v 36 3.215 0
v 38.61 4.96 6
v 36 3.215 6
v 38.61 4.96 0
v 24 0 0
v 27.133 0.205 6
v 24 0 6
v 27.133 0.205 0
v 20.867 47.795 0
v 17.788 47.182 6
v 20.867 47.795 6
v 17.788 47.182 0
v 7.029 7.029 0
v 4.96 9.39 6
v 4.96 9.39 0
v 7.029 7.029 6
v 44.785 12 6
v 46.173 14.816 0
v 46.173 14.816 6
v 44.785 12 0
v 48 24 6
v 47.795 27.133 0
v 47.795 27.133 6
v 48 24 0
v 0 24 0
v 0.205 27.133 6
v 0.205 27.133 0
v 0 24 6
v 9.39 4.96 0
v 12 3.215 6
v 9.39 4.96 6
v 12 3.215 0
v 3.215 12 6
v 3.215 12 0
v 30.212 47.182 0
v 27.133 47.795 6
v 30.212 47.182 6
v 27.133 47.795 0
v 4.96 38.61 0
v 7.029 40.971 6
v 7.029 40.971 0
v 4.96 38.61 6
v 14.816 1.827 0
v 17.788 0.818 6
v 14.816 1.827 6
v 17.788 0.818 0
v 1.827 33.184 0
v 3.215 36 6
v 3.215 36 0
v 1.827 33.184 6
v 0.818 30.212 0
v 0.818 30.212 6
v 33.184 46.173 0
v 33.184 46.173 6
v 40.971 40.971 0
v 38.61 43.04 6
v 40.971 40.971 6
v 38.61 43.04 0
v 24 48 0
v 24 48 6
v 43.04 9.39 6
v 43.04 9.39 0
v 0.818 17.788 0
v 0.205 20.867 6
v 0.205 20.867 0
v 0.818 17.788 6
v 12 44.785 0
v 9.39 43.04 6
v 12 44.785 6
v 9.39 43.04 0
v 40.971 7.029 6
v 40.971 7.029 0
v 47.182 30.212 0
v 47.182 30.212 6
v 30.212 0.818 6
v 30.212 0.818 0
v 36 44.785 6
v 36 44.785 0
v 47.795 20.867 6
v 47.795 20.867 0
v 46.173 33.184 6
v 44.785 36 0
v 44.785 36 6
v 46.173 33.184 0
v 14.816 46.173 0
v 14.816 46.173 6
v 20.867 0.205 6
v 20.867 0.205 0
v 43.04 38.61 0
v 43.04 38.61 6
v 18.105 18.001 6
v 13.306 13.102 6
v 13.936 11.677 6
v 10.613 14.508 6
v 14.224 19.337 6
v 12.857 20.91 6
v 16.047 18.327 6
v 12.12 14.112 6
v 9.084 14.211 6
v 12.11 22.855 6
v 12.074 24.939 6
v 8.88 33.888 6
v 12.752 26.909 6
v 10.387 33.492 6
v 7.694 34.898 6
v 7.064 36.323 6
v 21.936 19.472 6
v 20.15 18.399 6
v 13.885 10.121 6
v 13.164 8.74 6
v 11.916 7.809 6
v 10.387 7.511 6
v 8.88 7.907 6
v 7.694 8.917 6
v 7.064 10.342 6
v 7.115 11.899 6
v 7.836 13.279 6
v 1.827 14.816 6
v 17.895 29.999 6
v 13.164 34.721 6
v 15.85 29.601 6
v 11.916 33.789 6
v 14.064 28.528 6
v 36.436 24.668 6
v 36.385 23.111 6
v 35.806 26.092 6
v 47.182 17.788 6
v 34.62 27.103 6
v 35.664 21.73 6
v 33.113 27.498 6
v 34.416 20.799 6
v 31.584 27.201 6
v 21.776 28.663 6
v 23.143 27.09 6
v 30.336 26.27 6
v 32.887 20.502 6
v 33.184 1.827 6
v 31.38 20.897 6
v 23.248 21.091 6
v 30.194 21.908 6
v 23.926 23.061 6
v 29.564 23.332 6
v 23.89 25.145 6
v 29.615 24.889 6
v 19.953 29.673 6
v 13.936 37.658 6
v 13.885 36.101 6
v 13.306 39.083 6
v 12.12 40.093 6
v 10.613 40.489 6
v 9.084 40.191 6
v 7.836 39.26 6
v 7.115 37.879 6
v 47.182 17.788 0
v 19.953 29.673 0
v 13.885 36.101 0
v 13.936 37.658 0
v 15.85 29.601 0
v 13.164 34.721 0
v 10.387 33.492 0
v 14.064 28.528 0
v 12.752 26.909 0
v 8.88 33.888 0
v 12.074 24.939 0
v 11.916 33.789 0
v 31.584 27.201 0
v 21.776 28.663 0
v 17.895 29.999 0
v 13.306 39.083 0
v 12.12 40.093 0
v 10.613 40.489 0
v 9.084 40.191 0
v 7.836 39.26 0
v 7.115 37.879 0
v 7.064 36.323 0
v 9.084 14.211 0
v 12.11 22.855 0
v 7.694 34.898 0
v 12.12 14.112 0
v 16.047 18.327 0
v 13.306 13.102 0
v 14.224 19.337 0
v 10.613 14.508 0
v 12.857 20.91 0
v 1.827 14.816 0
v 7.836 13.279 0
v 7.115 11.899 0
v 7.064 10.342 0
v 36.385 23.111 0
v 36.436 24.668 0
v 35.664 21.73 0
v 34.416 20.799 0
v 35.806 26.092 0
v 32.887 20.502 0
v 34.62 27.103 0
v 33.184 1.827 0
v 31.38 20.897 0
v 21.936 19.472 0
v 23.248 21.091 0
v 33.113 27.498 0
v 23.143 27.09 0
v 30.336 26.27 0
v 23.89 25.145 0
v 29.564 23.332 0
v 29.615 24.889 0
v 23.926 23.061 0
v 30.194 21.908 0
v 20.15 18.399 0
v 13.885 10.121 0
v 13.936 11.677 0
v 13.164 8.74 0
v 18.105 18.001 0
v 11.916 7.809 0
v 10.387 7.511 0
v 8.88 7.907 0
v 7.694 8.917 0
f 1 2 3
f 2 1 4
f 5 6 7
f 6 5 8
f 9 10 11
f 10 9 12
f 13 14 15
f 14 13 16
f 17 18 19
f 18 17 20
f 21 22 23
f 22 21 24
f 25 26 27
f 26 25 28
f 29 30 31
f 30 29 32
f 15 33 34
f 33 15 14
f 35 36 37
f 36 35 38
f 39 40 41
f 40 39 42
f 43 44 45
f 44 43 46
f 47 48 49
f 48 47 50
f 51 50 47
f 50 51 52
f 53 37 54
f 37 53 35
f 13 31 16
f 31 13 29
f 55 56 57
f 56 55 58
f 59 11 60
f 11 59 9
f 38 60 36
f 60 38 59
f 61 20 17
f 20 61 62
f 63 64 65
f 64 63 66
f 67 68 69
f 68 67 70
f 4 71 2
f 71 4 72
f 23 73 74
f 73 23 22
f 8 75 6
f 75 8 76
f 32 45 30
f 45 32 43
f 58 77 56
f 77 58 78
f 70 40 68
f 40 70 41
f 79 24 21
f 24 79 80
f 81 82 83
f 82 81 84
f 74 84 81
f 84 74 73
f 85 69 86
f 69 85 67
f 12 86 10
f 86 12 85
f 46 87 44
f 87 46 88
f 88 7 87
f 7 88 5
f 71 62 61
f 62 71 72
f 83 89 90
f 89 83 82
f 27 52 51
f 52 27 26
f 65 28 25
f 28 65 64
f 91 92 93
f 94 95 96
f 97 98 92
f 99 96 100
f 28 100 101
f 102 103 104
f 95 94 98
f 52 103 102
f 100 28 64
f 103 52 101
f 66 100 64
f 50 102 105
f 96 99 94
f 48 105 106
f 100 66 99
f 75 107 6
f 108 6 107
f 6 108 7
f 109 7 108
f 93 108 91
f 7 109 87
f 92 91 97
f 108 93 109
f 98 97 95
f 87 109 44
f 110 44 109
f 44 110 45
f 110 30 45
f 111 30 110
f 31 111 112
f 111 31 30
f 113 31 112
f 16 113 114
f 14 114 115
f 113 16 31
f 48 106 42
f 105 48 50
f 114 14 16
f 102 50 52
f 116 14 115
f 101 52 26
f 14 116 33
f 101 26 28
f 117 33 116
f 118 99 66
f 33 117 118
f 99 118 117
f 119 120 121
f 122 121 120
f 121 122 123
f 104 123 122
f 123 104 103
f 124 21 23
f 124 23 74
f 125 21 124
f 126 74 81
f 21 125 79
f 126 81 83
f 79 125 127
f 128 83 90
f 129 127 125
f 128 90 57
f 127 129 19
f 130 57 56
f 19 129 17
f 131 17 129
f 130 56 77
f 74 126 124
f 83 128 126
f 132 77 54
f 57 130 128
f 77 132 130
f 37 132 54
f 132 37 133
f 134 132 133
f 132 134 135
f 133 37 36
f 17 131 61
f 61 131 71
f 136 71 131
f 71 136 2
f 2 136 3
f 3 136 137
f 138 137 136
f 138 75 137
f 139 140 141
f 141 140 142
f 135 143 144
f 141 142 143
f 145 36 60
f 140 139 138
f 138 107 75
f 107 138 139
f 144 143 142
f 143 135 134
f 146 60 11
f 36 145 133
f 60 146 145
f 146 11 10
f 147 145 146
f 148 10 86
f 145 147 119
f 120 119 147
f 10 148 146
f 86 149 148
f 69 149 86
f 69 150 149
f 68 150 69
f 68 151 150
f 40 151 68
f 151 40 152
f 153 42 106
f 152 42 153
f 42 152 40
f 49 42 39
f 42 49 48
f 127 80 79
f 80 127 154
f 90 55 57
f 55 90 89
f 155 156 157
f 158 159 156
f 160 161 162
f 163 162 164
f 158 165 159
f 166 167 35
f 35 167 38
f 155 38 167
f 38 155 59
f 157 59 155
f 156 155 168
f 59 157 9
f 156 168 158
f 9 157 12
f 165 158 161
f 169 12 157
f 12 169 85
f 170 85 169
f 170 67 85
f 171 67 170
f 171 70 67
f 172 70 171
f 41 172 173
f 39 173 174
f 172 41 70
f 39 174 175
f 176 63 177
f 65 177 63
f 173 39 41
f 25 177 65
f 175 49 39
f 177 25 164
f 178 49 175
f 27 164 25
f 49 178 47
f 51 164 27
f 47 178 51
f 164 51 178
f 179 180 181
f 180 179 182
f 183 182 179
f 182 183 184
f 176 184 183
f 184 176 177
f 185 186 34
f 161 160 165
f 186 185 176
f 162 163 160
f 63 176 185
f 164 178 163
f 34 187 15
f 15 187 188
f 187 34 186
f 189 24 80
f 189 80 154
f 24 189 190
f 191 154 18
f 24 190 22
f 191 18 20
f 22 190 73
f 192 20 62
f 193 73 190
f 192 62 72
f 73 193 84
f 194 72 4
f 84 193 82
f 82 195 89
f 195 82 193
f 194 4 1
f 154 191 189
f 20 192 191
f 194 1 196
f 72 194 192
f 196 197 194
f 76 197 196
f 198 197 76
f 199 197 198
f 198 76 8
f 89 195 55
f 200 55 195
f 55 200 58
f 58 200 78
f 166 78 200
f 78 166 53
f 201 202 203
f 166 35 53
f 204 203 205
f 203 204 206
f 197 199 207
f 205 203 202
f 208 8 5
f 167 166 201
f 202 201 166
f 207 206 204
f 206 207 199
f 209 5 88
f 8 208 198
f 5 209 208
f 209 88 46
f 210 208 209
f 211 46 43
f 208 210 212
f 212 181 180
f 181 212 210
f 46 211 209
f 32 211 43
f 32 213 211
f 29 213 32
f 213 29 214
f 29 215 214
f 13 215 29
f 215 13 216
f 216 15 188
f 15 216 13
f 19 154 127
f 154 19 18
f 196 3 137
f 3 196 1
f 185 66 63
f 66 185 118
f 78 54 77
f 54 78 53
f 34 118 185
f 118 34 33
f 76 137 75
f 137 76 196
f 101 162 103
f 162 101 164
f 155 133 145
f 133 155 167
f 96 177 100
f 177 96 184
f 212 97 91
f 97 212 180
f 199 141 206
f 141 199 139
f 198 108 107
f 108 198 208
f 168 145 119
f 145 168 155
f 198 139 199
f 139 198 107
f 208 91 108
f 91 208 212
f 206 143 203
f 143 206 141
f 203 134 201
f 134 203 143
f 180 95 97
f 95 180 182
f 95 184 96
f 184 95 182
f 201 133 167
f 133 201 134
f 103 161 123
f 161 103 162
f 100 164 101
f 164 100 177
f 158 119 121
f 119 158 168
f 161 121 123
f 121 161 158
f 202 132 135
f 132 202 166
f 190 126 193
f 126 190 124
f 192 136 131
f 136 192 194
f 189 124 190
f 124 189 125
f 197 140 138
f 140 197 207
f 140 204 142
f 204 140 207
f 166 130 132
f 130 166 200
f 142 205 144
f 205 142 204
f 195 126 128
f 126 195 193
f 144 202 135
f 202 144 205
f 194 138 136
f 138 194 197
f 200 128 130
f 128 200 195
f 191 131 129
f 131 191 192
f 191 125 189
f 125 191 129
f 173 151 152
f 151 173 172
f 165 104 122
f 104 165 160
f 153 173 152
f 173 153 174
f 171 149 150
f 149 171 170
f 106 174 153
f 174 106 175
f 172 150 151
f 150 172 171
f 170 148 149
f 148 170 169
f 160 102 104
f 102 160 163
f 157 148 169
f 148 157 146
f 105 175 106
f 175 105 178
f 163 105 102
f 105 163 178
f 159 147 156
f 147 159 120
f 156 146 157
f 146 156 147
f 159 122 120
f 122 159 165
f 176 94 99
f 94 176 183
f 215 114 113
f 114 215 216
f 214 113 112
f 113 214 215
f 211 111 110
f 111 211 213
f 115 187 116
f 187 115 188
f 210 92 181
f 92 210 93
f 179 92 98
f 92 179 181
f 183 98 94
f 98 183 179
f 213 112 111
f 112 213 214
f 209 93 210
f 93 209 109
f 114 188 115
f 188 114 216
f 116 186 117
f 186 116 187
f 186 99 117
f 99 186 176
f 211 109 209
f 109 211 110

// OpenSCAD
$fn = 32;

// ----------------------------------------------------------------------
// Cam plate: eccentric cam, base R24
// ----------------------------------------------------------------------

// --- parameters (mm) ---
base_r = 24;              // base circle radius
lobe_h = 14;              // cam lobe rise
bore_r = 6;               // shaft bore radius
plate_t = 6;              // plate thickness, Z (extrusion height)
ecc = 6;                  // disc eccentricity
ring_r = 15;              // lightening ring radius
bolt_r = 3.5;             // lightening hole radius
fit_tol = 0.05;           // declared fit tolerance (prompt contract)
free_tol = 0.2;           // declared free tolerance (prompt contract)

profile = [[48, 24], [47.795, 27.133], [47.182, 30.212], [46.173, 33.184], [44.785, 36], [43.04, 38.61], [40.971, 40.971], [38.61, 43.04], [36, 44.785], [33.184, 46.173], [30.212, 47.182], [27.133, 47.795], [24, 48], [20.867, 47.795], [17.788, 47.182], [14.816, 46.173], [12, 44.785], [9.39, 43.04], [7.029, 40.971], [4.96, 38.61], [3.215, 36], [1.827, 33.184], [0.818, 30.212], [0.205, 27.133], [0, 24], [0.205, 20.867], [0.818, 17.788], [1.827, 14.816], [3.215, 12], [4.96, 9.39], [7.029, 7.029], [9.39, 4.96], [12, 3.215], [14.816, 1.827], [17.788, 0.818], [20.867, 0.205], [24, 0], [27.133, 0.205], [30.212, 0.818], [33.184, 1.827], [36, 3.215], [38.61, 4.96], [40.971, 7.029], [43.04, 9.39], [44.785, 12], [46.173, 14.816], [47.182, 17.788], [47.795, 20.867]];  // primary outline, 48 points, counter clockwise
void_1 = [[23.89, 25.145], [23.143, 27.09], [21.776, 28.663], [19.953, 29.673], [17.895, 29.999], [15.85, 29.601], [14.064, 28.528], [12.752, 26.909], [12.074, 24.939], [12.11, 22.855], [12.857, 20.91], [14.224, 19.337], [16.047, 18.327], [18.105, 18.001], [20.15, 18.399], [21.936, 19.472], [23.248, 21.091], [23.926, 23.061]];  // shaft bore, 18 points
void_2 = [[36.436, 24.668], [35.806, 26.092], [34.62, 27.103], [33.113, 27.498], [31.584, 27.201], [30.336, 26.27], [29.615, 24.889], [29.564, 23.332], [30.194, 21.908], [31.38, 20.897], [32.887, 20.502], [34.416, 20.799], [35.664, 21.73], [36.385, 23.111]];  // lightening hole 1, 14 points
void_3 = [[13.936, 37.658], [13.306, 39.083], [12.12, 40.093], [10.613, 40.489], [9.084, 40.191], [7.836, 39.26], [7.115, 37.879], [7.064, 36.323], [7.694, 34.898], [8.88, 33.888], [10.387, 33.492], [11.916, 33.789], [13.164, 34.721], [13.885, 36.101]];  // lightening hole 2, 14 points
void_4 = [[13.936, 11.677], [13.306, 13.102], [12.12, 14.112], [10.613, 14.508], [9.084, 14.211], [7.836, 13.279], [7.115, 11.899], [7.064, 10.342], [7.694, 8.917], [8.88, 7.907], [10.387, 7.511], [11.916, 7.809], [13.164, 8.74], [13.885, 10.121]];  // lightening hole 3, 14 points

// --- the one profile operation ---
difference() {
  linear_extrude(height = plate_t) polygon(points = profile);
  translate([0, 0, -1])
    linear_extrude(height = plate_t + 2) polygon(points = void_1);
  translate([0, 0, -1])
    linear_extrude(height = plate_t + 2) polygon(points = void_2);
  translate([0, 0, -1])
    linear_extrude(height = plate_t + 2) polygon(points = void_3);
  translate([0, 0, -1])
    linear_extrude(height = plate_t + 2) polygon(points = void_4);
}
